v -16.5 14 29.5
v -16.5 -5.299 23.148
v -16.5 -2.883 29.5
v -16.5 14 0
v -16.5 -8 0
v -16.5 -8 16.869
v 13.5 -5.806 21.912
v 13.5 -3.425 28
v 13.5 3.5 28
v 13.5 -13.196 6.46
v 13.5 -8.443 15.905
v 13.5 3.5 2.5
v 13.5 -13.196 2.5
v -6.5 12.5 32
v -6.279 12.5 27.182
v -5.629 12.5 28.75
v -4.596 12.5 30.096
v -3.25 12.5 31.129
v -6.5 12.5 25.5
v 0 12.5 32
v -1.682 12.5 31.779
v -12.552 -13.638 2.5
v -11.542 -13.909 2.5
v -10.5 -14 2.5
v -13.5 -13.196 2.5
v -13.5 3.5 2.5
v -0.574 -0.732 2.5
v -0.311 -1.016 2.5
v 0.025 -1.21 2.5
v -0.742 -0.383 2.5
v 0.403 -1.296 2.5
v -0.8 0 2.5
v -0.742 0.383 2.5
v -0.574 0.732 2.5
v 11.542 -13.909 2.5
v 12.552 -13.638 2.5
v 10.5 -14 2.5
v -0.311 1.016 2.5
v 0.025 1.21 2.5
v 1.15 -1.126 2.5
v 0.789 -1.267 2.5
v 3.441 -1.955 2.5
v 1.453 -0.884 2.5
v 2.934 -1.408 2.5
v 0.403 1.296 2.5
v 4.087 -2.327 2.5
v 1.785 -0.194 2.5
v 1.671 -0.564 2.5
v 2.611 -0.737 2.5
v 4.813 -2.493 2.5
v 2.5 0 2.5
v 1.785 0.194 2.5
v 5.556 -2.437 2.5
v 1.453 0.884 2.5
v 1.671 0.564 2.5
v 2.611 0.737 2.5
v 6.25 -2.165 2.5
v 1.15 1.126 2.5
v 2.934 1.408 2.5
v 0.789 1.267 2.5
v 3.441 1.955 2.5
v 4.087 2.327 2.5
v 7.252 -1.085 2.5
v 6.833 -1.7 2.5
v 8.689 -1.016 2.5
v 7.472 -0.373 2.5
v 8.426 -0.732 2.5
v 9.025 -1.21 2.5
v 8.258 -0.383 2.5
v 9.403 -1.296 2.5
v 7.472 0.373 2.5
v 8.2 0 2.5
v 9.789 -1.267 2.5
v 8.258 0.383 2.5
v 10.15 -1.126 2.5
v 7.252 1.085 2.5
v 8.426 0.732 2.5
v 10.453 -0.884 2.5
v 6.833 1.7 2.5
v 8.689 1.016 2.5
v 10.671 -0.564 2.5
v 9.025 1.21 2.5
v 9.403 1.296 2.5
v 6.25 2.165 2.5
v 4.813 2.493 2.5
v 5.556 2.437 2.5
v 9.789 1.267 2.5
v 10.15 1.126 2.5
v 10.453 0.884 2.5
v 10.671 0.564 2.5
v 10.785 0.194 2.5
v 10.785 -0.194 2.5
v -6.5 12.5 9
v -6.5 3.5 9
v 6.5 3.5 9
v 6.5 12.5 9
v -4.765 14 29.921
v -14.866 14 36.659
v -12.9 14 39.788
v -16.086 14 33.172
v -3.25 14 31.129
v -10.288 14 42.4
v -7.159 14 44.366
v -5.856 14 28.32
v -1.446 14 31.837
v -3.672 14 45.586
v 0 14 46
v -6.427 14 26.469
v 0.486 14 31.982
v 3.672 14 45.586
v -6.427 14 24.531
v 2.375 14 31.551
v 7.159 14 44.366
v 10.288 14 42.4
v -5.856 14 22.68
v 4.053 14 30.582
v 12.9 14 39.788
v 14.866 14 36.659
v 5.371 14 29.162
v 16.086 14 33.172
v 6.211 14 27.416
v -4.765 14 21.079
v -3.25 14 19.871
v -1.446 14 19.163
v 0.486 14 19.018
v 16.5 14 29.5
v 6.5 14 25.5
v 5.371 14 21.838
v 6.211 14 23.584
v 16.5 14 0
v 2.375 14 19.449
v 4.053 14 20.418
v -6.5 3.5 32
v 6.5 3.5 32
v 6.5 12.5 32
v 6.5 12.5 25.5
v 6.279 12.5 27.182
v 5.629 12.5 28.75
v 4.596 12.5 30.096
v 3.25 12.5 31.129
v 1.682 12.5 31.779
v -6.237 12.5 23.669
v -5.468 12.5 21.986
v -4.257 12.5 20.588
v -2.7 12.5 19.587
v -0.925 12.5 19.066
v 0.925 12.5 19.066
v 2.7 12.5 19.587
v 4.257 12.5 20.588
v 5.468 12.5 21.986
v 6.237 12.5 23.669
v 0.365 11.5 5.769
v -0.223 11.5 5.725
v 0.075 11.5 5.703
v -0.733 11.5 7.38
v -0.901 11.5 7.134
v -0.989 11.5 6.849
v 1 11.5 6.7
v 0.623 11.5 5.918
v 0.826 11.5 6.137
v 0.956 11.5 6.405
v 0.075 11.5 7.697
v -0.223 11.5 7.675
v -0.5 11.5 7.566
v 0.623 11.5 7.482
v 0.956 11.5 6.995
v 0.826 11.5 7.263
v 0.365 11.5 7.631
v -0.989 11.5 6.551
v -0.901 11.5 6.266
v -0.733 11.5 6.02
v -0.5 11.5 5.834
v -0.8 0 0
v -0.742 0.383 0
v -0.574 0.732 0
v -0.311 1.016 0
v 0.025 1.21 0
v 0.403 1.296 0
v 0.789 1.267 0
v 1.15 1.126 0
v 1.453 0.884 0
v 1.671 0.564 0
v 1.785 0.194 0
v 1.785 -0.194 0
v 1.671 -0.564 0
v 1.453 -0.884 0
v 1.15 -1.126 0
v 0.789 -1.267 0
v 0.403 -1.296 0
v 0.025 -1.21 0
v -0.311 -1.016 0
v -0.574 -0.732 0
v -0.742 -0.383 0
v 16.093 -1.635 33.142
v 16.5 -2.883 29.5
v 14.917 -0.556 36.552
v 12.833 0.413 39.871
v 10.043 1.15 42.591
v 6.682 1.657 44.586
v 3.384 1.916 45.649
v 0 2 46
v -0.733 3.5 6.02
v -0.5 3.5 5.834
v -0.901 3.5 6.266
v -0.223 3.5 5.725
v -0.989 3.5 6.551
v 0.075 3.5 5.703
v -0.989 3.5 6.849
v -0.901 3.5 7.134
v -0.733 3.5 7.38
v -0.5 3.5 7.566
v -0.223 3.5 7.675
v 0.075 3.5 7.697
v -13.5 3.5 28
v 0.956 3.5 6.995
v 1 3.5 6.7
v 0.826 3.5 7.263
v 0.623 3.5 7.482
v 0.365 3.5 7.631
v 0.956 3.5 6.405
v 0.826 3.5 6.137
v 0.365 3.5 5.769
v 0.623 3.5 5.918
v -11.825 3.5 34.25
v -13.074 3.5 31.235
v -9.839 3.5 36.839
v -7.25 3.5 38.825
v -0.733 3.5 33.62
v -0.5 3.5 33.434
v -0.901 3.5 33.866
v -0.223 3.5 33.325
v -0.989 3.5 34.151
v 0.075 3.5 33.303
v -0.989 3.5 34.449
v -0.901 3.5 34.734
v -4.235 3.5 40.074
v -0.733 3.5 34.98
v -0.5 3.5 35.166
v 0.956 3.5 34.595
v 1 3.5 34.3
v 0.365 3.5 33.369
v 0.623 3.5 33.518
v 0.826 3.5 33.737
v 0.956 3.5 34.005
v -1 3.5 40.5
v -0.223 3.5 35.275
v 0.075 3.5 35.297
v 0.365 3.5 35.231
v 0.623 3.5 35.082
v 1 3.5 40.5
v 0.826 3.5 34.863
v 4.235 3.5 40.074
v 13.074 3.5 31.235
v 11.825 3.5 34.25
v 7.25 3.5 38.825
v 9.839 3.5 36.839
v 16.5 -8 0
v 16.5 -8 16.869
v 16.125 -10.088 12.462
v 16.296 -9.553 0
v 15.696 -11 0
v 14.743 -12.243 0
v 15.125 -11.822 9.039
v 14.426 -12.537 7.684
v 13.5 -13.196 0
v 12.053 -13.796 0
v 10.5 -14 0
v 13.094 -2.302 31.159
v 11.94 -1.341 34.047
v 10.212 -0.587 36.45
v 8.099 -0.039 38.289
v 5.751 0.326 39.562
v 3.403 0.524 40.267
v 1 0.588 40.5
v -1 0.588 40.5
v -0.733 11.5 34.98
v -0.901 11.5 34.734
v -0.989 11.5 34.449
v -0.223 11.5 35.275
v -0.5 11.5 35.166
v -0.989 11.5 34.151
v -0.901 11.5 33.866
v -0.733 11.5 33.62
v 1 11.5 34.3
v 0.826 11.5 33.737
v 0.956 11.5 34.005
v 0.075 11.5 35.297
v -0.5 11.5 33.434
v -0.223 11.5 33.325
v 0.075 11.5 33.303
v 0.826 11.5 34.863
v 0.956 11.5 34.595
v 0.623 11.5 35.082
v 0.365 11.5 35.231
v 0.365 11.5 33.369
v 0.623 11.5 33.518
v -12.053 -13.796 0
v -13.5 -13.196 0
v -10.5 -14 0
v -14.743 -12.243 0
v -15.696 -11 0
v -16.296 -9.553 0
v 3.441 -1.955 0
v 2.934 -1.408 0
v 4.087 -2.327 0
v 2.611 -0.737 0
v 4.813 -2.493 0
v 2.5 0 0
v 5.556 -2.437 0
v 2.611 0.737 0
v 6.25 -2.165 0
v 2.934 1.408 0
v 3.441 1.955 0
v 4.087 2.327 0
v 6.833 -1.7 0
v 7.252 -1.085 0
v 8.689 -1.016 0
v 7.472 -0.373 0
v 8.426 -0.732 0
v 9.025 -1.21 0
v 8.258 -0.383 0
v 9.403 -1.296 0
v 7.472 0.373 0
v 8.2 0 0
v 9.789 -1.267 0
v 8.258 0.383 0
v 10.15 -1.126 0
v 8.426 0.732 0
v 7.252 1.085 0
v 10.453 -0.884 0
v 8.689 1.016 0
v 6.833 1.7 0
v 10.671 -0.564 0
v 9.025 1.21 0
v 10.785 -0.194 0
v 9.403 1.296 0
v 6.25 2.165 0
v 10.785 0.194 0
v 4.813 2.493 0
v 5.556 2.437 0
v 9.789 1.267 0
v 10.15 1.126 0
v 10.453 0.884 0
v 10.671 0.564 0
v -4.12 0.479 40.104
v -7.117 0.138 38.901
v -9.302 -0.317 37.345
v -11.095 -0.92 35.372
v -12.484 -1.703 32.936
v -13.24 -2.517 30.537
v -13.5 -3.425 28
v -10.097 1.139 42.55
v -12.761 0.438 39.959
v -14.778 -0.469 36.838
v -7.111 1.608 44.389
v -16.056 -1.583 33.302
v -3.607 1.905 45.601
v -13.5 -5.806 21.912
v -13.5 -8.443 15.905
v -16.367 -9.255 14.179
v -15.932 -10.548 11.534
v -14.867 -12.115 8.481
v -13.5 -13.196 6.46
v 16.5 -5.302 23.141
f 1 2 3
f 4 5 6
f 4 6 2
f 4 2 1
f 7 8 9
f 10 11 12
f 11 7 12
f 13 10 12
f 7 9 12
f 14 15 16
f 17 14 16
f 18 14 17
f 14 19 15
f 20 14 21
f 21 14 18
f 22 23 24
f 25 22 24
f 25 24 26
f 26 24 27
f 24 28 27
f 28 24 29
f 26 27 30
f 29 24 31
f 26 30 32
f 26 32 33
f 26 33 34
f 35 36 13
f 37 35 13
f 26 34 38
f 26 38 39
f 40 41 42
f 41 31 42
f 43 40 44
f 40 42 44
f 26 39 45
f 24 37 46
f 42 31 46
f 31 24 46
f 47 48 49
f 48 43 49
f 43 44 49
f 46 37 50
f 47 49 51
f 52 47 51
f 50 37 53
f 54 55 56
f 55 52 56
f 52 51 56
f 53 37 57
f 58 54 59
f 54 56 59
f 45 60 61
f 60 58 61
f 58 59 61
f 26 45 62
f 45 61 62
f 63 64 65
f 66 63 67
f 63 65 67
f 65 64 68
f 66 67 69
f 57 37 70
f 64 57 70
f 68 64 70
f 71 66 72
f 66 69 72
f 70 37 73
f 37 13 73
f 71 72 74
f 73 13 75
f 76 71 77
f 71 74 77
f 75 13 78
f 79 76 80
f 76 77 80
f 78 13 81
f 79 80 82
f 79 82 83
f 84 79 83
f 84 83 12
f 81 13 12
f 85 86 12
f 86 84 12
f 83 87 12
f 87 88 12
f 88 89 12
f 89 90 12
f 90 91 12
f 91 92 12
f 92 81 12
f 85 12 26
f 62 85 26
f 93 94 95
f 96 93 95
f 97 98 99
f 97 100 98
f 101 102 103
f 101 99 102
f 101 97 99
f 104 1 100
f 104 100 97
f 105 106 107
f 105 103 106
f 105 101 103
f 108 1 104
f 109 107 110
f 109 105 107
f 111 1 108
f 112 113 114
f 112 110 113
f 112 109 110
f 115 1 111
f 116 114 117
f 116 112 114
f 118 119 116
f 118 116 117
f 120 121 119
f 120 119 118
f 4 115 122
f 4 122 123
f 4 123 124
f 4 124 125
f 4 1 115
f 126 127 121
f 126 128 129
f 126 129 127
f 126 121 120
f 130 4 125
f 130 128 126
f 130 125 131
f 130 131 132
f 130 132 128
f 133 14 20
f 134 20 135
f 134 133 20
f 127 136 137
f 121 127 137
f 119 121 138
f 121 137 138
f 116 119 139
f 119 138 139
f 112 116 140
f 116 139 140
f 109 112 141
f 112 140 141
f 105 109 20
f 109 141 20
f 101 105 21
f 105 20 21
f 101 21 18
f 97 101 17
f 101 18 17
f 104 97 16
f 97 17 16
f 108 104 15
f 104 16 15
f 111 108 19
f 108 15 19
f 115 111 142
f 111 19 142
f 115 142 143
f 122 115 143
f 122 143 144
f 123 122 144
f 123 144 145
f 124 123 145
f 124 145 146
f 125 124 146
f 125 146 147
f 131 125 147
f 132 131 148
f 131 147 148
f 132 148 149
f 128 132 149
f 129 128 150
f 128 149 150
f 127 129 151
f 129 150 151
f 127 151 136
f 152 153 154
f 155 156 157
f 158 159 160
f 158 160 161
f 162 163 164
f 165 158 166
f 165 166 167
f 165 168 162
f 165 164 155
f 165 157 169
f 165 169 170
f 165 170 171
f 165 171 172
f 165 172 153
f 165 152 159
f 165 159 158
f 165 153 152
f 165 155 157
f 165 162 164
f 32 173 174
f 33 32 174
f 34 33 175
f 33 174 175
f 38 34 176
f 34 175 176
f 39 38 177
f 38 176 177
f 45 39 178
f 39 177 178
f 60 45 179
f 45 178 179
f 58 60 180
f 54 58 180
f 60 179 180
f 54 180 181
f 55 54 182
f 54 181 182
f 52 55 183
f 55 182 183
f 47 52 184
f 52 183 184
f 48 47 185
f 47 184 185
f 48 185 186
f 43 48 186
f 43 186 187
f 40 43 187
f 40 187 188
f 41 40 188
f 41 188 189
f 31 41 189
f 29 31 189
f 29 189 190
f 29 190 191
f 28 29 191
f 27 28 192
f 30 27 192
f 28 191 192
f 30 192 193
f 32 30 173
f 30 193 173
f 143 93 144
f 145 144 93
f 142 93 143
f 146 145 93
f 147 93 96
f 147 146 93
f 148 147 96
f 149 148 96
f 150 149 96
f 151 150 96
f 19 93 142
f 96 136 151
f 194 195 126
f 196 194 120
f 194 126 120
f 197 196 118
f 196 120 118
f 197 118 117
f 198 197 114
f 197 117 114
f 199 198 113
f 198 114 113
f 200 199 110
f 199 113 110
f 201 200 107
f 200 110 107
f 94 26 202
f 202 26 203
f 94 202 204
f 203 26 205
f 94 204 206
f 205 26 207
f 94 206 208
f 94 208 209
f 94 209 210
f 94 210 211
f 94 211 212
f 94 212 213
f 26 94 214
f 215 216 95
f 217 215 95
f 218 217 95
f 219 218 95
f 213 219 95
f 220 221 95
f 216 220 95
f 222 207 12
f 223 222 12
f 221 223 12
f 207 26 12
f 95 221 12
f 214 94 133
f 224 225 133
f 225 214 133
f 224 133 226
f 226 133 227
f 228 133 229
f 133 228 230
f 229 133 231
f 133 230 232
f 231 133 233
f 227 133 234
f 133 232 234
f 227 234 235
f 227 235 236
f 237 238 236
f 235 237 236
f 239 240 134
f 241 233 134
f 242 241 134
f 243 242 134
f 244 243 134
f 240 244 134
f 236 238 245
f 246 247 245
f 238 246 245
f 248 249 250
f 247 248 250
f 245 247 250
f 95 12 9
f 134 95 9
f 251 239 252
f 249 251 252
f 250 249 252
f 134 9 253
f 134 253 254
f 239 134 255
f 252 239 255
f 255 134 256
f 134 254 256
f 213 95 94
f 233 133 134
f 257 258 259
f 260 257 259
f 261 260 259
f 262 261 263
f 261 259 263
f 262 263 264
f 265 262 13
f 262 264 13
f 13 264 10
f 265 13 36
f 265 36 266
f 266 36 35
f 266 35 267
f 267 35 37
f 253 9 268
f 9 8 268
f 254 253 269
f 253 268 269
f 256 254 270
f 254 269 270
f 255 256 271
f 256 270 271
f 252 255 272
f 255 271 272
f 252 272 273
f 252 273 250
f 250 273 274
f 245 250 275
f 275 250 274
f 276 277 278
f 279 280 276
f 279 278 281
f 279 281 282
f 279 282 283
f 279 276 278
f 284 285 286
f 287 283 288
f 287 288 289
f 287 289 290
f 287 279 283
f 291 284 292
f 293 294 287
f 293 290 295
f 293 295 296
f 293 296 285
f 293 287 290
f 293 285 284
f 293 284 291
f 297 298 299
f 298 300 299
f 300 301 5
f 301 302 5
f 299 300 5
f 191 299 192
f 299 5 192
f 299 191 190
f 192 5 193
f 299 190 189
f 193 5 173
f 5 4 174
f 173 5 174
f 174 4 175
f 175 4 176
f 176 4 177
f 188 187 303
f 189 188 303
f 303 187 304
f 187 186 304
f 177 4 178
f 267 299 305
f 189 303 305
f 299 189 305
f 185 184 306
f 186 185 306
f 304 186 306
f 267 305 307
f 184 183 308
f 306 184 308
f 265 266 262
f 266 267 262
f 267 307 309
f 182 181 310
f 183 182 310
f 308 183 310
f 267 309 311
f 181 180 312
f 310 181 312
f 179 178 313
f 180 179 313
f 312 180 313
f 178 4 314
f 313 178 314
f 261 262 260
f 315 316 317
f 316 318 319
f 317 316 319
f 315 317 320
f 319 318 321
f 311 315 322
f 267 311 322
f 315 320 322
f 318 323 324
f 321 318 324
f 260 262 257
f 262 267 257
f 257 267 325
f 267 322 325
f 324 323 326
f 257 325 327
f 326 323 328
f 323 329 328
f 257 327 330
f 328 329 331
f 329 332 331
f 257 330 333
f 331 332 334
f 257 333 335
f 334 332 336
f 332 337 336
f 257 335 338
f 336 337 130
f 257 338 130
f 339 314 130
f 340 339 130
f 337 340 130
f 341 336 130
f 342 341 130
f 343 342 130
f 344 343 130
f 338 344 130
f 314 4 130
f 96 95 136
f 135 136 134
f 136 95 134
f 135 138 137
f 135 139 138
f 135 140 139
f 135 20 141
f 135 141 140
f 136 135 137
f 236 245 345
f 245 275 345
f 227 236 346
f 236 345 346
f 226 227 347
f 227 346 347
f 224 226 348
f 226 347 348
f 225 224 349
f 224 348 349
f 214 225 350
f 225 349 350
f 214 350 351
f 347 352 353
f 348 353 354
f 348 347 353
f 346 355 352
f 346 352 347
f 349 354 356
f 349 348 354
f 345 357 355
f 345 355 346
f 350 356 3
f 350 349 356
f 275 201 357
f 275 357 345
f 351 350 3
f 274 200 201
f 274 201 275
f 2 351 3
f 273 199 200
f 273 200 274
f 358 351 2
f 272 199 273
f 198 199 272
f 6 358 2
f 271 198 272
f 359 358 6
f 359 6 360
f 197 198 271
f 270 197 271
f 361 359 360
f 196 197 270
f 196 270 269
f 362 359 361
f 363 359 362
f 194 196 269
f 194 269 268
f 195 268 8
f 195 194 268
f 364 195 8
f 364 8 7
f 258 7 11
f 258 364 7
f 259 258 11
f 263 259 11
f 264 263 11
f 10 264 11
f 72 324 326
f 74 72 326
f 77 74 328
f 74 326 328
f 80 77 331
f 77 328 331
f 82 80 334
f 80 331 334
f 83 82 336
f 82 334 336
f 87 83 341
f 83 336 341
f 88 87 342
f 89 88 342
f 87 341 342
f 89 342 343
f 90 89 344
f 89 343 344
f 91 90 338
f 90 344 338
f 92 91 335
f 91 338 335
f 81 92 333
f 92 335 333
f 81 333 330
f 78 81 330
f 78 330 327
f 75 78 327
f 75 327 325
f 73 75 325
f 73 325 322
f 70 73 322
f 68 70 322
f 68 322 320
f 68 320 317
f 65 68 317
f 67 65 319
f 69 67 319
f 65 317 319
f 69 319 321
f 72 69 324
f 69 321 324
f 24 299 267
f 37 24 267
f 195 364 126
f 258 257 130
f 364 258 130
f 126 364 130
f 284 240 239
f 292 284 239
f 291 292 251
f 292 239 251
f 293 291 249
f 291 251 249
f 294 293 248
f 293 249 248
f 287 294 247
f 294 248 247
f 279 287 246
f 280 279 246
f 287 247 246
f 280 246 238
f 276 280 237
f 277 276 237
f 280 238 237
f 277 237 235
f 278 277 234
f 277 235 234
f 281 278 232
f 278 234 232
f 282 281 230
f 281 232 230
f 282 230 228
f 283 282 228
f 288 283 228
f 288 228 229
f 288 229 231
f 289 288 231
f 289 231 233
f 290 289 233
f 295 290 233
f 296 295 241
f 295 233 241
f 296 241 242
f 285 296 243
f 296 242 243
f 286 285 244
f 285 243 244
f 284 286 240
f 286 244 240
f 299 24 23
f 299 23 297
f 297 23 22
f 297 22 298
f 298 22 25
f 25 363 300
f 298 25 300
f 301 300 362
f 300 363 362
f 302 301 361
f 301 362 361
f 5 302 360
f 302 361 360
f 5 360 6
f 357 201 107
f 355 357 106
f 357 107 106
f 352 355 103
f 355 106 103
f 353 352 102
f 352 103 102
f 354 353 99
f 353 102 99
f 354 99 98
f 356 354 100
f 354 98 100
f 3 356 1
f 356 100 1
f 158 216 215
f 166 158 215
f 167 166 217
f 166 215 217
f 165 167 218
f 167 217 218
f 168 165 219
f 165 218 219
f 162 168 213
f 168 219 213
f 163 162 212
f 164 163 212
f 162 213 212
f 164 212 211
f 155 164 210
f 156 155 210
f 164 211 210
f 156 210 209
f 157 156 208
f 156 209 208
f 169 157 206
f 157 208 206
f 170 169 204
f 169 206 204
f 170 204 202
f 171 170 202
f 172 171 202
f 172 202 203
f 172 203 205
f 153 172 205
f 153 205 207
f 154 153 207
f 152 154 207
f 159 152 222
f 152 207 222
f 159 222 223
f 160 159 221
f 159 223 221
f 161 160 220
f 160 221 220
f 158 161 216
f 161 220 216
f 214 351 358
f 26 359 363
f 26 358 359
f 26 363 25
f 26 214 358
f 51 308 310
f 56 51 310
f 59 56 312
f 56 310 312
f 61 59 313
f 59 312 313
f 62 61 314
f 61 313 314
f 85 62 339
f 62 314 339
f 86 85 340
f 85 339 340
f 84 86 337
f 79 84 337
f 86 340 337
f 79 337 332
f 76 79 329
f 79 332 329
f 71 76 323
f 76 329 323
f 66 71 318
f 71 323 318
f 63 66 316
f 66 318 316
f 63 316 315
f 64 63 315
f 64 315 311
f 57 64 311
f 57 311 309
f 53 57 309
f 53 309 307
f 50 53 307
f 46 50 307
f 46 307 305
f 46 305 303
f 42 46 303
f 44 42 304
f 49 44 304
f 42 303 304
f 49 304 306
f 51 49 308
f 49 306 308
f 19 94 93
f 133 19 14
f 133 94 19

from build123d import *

# Parameters (mm, degrees)
SKETCH1_W           = 33
SKETCH1_H           = 28
BOSS_EXTRUDE1_DEPTH = 46
CUT_EXTRUDE1_DEPTH  = 59.318093247
CUT_EXTRUDE2_START  = -3
CUT_EXTRUDE2_DEPTH  = 27
FILLET1_R           = 12.5
FILLET2_R           = 16.5
FILLET3_R           = 6
SKETCH5_W           = 13
SKETCH5_H           = 23
CUT_EXTRUDE3_DEPTH  = 9
SKETCH6_R           = 6.5
CUT_EXTRUDE5_DEPTH  = 56.592265809
SKETCH7_R           = 1
CUT_EXTRUDE6_DEPTH  = 8
SKETCH8_R           = 1.3
SKETCH8_R_2         = 2.5
CUT_EXTRUDE7_DEPTH  = 2.5


with BuildPart() as part:
    # Sketch1 → Boss-Extrude1 (new body)
    with BuildSketch(Plane.XY):
        Rectangle(SKETCH1_W, SKETCH1_H)
    extrude(amount=BOSS_EXTRUDE1_DEPTH)

    # Sketch3 → Cut-Extrude1 (cut, through all)
    with BuildSketch(Plane(origin=(16.5, 0, 0), x_dir=(0, 0, -1), z_dir=(1, 0, 0))):
        with BuildLine():
            Line((-5, -14), (-46, -14))
            Line((-46, -14), (-46, 2))
            add(Edge.make_bspline(
                [(-46, 2), (-24.590873565, -3.089136006), (-5, -14)],
                knots=[0, 0, 0, 1, 1, 1], degree=2))
        make_face()
    extrude(amount=-CUT_EXTRUDE1_DEPTH, mode=Mode.SUBTRACT)

    # Sketch4 → Cut-Extrude2 (cut)
    with BuildSketch(Plane(origin=(16.5, 0, 0), x_dir=(0, 0, -1), z_dir=(1, 0, 0)).offset(CUT_EXTRUDE2_START)):
        with BuildLine():
            Line((-5, -14), (-2.5, -14))
            Line((-2.5, -14), (-2.5, 3.5))
            Line((-2.5, 3.5), (-40.5, 3.5))
            Line((-40.5, 3.5), (-40.5, 0.588274649))
            add(Edge.make_bspline(
                [(-5, -14), (-22.060550055, -4.498364419), (-40.5, 0.588274649)],
                knots=[0, 0, 0, 1, 1, 1], degree=2))
        make_face()
    extrude(amount=-CUT_EXTRUDE2_DEPTH, mode=Mode.SUBTRACT)

    # Fillet1
    fillet1_edges = [part.edges().sort_by_distance(p)[0] for p in [
        (13.5, 2.044137325, 40.5),
        (-13.5, 2.044137325, 40.5),
    ]]
    fillet(fillet1_edges, radius=FILLET1_R)

    # Fillet2
    fillet2_edges = [part.edges().sort_by_distance(p)[0] for p in [
        (16.5, 8, 46),
        (-16.5, 8, 46),
    ]]
    fillet(fillet2_edges, radius=FILLET2_R - 0.0001)  # a hair under: the kernel refuses the full size

    # Fillet3
    fillet3_edges = [part.edges().sort_by_distance(p)[0] for p in [
        (-16.5, -14, 2.5),
        (16.5, -14, 2.5),
    ]]
    fillet(fillet3_edges, radius=FILLET3_R)

    # Sketch5 → Cut-Extrude3 (cut)
    with BuildSketch(Plane.XZ.offset(-3.5)):
        with Locations((0, 20.5)):
            Rectangle(SKETCH5_W, SKETCH5_H)
    extrude(amount=-CUT_EXTRUDE3_DEPTH, mode=Mode.SUBTRACT)

    # Sketch6 → Cut-Extrude5 (cut, through all)
    with BuildSketch(Plane.XZ.offset(-12.5)):
        with Locations((0, 25.5)):
            Circle(SKETCH6_R)
    extrude(amount=-CUT_EXTRUDE5_DEPTH, mode=Mode.SUBTRACT)

    # Sketch7 → Cut-Extrude6 (cut)
    with BuildSketch(Plane.XZ.offset(-3.5)):
        with Locations((0, 34.3)):
            Circle(SKETCH7_R)
        with Locations((0, 6.7)):
            Circle(SKETCH7_R)
    extrude(amount=-CUT_EXTRUDE6_DEPTH, mode=Mode.SUBTRACT)

    # Sketch8 → Cut-Extrude7 (cut)
    with BuildSketch(Plane(origin=(0, 0, 0), x_dir=(-1, 0, 0), z_dir=(0, 0, -1))):
        with Locations((-9.5, 0)):
            Circle(SKETCH8_R)
        with Locations((-5, 0)):
            Circle(SKETCH8_R_2)
        with Locations((-0.5, 0)):
            Circle(SKETCH8_R)
    extrude(amount=-CUT_EXTRUDE7_DEPTH, mode=Mode.SUBTRACT)


solid = part.part
